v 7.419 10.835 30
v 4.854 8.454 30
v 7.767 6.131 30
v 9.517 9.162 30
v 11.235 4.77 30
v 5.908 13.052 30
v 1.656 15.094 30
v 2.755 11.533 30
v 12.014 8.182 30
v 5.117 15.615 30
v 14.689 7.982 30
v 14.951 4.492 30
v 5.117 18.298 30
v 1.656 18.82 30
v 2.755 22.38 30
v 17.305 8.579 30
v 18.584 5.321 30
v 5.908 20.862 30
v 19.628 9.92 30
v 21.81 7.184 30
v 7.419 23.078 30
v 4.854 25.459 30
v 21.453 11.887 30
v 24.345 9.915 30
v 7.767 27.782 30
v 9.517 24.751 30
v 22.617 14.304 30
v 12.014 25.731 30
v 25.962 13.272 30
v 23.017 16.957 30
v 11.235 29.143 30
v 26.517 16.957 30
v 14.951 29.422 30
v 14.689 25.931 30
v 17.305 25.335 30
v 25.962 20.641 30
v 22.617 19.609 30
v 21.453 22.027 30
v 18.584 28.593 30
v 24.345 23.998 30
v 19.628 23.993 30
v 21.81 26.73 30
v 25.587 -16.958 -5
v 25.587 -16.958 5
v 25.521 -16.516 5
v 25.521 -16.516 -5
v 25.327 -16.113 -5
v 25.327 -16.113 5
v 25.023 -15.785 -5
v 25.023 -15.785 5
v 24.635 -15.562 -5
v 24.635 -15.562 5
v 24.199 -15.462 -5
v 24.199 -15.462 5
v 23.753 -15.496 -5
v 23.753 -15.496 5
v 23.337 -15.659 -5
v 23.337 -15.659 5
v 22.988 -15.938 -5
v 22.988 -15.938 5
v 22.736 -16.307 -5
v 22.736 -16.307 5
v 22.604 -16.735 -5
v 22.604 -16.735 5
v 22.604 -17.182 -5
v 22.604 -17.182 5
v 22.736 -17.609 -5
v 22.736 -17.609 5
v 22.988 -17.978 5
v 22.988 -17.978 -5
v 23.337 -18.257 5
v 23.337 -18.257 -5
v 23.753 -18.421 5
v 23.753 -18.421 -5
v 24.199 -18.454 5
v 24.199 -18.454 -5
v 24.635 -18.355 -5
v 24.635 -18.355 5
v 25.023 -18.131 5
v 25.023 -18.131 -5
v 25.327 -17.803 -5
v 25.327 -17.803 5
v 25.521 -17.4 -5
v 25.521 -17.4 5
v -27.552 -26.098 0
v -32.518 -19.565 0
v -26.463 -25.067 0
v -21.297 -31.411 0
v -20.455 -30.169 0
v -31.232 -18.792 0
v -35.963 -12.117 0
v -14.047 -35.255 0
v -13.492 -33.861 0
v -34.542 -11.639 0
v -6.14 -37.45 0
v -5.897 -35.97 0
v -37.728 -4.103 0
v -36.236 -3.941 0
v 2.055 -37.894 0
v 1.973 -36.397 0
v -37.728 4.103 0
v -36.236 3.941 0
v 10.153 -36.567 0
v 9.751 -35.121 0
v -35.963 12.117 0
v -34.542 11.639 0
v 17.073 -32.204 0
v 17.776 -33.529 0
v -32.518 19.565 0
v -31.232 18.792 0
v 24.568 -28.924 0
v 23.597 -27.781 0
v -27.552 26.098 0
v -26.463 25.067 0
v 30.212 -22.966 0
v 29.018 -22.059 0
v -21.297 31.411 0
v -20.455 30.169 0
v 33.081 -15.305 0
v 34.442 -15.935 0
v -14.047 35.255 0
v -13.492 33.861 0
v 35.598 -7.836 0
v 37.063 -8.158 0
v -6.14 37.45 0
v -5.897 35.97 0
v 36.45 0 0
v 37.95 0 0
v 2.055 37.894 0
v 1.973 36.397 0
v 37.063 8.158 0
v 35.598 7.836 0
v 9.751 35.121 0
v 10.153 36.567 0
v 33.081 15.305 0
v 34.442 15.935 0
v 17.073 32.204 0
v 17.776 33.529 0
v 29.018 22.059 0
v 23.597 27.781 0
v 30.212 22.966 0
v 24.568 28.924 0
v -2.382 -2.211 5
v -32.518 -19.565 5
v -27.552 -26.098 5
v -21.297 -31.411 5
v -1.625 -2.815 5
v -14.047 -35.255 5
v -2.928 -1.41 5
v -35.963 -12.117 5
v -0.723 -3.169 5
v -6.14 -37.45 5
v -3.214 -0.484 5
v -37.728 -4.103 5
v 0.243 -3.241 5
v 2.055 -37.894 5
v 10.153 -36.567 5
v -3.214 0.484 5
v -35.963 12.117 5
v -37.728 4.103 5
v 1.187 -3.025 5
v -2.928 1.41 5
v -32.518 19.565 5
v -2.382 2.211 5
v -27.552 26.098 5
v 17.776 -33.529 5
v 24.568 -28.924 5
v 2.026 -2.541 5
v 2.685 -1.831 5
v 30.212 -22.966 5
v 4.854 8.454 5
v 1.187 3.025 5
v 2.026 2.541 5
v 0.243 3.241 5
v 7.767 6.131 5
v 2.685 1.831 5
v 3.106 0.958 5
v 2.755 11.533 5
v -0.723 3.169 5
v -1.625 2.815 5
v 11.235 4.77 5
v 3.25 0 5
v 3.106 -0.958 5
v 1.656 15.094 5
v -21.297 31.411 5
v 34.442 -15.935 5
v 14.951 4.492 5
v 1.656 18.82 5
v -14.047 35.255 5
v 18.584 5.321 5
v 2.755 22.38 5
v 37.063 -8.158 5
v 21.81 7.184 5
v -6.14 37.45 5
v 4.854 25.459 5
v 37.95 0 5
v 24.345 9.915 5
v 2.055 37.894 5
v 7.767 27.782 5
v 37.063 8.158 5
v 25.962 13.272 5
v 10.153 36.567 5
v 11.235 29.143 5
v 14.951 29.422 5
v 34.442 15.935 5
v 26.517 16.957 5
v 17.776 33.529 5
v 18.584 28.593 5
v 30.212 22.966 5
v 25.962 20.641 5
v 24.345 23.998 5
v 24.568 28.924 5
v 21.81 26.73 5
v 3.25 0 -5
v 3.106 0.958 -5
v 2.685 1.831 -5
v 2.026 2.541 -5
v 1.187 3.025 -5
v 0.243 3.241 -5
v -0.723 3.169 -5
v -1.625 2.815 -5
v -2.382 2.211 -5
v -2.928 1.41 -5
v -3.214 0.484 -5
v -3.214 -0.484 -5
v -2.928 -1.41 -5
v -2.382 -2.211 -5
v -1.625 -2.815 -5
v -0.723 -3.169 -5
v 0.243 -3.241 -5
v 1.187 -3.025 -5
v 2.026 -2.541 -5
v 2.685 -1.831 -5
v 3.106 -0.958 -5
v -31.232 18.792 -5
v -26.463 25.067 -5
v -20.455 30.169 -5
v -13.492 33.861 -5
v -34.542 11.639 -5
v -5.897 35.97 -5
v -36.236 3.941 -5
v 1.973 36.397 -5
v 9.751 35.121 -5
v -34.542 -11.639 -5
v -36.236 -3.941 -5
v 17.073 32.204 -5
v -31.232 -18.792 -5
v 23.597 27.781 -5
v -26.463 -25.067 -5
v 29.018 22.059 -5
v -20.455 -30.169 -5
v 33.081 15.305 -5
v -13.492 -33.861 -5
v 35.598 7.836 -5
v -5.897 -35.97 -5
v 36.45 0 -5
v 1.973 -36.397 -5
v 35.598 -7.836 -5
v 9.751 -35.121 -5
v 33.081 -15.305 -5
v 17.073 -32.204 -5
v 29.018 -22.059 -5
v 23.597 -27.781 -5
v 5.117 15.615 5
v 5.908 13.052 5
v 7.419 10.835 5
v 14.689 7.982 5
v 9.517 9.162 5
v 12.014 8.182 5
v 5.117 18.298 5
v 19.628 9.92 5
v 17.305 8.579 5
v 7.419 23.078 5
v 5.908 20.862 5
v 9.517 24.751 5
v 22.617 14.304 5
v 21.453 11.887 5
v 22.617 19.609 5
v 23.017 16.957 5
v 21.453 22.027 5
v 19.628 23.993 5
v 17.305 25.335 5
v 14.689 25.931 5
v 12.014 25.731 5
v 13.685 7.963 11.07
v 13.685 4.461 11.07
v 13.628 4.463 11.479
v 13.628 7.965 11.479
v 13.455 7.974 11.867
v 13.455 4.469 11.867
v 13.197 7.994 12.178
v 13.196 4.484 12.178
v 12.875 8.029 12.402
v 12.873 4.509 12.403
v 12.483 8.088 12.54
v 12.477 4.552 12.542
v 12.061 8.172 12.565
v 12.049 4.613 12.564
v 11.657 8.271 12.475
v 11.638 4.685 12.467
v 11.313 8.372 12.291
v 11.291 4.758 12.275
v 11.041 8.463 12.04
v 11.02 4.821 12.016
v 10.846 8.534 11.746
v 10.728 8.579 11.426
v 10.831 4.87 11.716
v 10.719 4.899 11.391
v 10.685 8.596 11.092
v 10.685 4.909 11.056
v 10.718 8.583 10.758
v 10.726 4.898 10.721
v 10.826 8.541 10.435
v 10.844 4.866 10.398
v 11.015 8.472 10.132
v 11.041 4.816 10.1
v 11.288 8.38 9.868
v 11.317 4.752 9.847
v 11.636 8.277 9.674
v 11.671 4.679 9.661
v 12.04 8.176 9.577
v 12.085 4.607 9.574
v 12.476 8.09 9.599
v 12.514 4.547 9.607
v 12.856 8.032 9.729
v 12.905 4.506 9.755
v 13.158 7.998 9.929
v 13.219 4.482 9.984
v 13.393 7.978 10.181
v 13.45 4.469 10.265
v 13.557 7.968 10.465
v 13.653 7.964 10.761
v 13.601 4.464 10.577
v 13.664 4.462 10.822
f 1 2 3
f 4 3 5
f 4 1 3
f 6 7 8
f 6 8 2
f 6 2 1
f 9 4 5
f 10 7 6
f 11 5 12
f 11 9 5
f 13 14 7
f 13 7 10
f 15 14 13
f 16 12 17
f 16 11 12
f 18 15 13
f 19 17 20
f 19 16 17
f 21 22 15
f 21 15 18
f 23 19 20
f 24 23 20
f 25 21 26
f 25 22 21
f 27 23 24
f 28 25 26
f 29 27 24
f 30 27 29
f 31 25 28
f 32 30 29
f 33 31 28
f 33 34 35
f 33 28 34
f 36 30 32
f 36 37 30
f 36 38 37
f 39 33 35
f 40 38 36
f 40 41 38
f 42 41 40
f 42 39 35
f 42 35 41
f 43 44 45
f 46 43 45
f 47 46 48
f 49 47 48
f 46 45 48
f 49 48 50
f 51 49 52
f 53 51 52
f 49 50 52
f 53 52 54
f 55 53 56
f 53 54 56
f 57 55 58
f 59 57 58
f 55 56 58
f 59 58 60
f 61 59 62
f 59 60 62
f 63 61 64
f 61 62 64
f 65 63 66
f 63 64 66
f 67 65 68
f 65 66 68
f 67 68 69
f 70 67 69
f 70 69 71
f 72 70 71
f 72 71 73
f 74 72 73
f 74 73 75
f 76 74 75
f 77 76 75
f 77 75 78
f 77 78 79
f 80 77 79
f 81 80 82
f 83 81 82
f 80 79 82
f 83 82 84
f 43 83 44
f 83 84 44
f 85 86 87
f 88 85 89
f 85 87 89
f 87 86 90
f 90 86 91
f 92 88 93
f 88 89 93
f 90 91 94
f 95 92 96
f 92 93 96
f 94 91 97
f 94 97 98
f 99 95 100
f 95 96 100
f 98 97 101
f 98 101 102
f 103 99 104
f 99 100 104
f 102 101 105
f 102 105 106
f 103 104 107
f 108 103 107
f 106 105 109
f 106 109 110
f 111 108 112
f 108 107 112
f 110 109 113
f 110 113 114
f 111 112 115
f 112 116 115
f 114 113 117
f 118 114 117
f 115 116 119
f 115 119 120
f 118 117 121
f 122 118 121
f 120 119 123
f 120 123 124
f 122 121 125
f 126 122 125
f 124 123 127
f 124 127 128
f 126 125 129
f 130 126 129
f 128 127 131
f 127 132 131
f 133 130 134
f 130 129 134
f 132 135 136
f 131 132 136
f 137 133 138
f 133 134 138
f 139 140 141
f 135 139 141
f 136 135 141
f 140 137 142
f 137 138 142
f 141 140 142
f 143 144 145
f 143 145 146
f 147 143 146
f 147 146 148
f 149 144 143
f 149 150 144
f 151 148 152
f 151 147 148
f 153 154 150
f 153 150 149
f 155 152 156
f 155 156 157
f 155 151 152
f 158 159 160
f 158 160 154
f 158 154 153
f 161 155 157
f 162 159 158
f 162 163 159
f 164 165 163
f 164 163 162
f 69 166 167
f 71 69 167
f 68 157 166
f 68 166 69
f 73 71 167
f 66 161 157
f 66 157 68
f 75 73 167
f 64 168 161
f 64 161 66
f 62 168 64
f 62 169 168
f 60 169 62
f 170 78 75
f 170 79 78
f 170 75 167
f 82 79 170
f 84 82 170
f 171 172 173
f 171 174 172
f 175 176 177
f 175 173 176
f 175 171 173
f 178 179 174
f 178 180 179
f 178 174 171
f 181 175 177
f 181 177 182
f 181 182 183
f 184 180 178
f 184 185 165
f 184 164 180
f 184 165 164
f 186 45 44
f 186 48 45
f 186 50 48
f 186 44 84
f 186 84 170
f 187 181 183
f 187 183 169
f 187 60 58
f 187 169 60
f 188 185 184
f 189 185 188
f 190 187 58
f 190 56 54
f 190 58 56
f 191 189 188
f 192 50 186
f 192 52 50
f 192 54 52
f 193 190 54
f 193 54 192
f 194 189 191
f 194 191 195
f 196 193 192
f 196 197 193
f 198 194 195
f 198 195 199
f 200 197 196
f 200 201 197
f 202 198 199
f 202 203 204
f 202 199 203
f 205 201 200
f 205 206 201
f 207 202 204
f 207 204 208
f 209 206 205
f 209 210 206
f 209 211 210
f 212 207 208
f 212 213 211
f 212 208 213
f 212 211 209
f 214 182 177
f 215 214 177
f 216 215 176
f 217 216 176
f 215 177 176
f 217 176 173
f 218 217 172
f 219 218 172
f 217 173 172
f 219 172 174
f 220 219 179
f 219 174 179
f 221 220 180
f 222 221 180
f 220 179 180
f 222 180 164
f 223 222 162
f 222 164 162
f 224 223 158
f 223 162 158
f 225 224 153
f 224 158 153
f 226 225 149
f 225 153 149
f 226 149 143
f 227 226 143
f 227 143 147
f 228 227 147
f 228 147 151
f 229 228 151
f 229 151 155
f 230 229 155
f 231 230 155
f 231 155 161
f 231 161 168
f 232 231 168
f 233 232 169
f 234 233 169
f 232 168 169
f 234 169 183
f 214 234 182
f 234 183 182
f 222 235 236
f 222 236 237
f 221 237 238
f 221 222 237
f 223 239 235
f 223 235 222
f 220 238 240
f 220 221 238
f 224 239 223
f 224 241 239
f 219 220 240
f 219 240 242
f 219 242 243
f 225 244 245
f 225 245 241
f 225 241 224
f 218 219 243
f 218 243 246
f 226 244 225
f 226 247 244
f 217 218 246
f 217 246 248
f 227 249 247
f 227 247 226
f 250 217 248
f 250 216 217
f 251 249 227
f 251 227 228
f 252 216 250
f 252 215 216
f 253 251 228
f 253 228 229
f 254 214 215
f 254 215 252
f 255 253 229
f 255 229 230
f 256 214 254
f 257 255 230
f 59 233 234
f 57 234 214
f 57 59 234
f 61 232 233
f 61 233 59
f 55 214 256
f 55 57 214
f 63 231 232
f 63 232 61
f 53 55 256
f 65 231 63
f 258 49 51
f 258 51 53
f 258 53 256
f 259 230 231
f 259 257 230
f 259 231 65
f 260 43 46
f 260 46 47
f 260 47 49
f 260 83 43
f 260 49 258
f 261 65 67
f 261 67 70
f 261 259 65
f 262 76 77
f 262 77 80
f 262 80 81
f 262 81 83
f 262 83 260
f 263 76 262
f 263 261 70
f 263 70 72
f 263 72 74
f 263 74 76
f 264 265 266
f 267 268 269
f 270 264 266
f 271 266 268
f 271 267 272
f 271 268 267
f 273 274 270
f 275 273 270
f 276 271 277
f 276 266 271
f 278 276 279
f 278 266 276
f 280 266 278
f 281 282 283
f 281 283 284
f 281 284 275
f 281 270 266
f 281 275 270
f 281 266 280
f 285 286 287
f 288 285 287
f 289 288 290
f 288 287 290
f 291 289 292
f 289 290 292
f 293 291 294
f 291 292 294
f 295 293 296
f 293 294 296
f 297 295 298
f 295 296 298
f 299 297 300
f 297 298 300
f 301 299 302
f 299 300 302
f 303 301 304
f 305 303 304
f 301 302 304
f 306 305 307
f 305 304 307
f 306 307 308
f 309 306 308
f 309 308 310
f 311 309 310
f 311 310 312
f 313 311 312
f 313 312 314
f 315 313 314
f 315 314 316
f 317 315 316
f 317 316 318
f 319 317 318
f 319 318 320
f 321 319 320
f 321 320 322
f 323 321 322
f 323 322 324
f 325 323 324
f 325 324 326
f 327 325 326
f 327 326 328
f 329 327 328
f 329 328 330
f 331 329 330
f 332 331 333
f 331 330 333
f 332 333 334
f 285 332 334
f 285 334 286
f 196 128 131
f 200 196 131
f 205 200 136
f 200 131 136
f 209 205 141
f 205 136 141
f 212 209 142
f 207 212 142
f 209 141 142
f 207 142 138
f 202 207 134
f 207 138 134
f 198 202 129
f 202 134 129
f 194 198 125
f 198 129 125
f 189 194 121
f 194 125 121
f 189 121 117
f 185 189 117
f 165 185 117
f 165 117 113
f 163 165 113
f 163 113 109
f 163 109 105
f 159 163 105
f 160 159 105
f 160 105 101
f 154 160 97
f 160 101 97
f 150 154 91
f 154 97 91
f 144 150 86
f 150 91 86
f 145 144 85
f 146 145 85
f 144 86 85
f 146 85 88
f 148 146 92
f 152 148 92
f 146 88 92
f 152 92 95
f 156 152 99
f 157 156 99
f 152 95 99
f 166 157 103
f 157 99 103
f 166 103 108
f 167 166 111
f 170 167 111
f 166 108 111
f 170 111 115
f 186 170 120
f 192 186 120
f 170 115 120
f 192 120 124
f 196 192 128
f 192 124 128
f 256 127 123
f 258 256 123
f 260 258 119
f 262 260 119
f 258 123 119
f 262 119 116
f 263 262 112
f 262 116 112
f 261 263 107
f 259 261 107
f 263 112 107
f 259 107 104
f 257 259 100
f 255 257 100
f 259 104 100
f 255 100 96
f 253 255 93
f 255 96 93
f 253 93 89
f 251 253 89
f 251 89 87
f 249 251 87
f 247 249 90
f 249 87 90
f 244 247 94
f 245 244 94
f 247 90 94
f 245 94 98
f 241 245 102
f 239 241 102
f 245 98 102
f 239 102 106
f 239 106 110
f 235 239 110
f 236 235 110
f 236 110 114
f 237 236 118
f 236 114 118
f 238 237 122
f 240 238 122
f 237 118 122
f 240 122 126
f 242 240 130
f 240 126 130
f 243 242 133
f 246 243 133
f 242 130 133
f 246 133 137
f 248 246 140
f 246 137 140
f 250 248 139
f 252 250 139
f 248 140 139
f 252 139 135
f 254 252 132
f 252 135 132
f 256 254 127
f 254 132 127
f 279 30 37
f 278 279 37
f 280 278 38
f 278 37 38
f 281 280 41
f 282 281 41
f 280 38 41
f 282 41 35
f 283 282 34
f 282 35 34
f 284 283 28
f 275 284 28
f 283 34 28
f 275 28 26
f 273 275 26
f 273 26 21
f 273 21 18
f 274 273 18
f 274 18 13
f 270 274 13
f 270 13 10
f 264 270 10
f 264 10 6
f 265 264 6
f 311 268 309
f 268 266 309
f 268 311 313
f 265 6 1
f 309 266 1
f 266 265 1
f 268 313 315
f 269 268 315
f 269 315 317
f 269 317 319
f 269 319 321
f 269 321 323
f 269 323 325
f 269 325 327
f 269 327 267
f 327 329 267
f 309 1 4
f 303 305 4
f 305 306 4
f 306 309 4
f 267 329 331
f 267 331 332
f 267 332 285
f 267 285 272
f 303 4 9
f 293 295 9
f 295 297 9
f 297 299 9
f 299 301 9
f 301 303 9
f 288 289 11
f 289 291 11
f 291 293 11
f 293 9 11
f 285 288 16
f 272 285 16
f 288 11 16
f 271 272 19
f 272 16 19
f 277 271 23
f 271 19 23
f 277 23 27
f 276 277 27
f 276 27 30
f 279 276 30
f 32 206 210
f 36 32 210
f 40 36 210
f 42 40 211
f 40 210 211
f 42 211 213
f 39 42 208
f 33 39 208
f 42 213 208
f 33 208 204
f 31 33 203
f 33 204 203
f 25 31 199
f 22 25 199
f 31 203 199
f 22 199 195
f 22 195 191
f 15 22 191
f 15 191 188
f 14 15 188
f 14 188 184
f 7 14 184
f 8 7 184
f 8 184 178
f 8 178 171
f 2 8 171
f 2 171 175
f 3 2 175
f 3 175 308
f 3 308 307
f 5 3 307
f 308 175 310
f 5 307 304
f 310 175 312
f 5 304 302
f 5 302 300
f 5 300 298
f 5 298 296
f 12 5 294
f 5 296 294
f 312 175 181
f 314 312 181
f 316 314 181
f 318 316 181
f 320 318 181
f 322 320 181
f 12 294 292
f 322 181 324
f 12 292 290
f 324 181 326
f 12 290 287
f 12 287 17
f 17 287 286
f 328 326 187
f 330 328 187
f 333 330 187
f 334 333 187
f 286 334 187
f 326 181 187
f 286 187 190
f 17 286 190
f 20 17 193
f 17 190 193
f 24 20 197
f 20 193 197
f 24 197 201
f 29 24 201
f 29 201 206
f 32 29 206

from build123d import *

# Parameters (mm, degrees)
F0_R      = 37.95
F1_DEPTH  = 5
F2_R      = 36.45
F3_DEPTH  = 5
F4_R      = 3.25
F5_DEPTH  = 10
F6_R      = 12.5
F7_DEPTH  = 25
F8_R      = 9
F9_DEPTH  = 25
F10_R     = 1.5
F11_DEPTH = 10
F12_R     = 1.5
F13_DEPTH = 10


with BuildPart() as f1:
    # F0 (on Top) → F1 (new body)
    with BuildSketch(Plane.XY):
        Circle(F0_R)
    extrude(amount=F1_DEPTH)

    # F2 (on face) → F3 (join)
    with BuildSketch(Plane(origin=(0, 0, 0), x_dir=(1, 0, 0), z_dir=(0, 0, -1))):
        Circle(F2_R)
    extrude(amount=F3_DEPTH)

    # F4 (on face) → F5 (cut)
    with BuildSketch(Plane.XY.offset(5)):
        Circle(F4_R)
    extrude(amount=-F5_DEPTH, mode=Mode.SUBTRACT)

    # F6 (on face) → F7 (join)
    with BuildSketch(Plane.XY.offset(5)):
        with Locations((14.016853, 16.956646)):
            Circle(F6_R)
    extrude(amount=F7_DEPTH)

    # F8 (on face) → F9 (cut)
    with BuildSketch(Plane.XY.offset(30)):
        with Locations((14.016853, 16.956646)):
            Circle(F8_R)
    extrude(amount=-F9_DEPTH, mode=Mode.SUBTRACT)

    # F10 (on face) → F11 (cut)
    with BuildSketch(Plane.XY.offset(5)):
        with Locations((24.087269, -16.958203)):
            Circle(F10_R)
    extrude(amount=-F11_DEPTH, mode=Mode.SUBTRACT)

    # F12 (on Front) → F13 (cut)
    with BuildSketch(Plane.XZ):
        with Locations((12.184734, 11.070393)):
            Circle(F12_R)
    extrude(amount=-F13_DEPTH, mode=Mode.SUBTRACT)


solid = f1.part
